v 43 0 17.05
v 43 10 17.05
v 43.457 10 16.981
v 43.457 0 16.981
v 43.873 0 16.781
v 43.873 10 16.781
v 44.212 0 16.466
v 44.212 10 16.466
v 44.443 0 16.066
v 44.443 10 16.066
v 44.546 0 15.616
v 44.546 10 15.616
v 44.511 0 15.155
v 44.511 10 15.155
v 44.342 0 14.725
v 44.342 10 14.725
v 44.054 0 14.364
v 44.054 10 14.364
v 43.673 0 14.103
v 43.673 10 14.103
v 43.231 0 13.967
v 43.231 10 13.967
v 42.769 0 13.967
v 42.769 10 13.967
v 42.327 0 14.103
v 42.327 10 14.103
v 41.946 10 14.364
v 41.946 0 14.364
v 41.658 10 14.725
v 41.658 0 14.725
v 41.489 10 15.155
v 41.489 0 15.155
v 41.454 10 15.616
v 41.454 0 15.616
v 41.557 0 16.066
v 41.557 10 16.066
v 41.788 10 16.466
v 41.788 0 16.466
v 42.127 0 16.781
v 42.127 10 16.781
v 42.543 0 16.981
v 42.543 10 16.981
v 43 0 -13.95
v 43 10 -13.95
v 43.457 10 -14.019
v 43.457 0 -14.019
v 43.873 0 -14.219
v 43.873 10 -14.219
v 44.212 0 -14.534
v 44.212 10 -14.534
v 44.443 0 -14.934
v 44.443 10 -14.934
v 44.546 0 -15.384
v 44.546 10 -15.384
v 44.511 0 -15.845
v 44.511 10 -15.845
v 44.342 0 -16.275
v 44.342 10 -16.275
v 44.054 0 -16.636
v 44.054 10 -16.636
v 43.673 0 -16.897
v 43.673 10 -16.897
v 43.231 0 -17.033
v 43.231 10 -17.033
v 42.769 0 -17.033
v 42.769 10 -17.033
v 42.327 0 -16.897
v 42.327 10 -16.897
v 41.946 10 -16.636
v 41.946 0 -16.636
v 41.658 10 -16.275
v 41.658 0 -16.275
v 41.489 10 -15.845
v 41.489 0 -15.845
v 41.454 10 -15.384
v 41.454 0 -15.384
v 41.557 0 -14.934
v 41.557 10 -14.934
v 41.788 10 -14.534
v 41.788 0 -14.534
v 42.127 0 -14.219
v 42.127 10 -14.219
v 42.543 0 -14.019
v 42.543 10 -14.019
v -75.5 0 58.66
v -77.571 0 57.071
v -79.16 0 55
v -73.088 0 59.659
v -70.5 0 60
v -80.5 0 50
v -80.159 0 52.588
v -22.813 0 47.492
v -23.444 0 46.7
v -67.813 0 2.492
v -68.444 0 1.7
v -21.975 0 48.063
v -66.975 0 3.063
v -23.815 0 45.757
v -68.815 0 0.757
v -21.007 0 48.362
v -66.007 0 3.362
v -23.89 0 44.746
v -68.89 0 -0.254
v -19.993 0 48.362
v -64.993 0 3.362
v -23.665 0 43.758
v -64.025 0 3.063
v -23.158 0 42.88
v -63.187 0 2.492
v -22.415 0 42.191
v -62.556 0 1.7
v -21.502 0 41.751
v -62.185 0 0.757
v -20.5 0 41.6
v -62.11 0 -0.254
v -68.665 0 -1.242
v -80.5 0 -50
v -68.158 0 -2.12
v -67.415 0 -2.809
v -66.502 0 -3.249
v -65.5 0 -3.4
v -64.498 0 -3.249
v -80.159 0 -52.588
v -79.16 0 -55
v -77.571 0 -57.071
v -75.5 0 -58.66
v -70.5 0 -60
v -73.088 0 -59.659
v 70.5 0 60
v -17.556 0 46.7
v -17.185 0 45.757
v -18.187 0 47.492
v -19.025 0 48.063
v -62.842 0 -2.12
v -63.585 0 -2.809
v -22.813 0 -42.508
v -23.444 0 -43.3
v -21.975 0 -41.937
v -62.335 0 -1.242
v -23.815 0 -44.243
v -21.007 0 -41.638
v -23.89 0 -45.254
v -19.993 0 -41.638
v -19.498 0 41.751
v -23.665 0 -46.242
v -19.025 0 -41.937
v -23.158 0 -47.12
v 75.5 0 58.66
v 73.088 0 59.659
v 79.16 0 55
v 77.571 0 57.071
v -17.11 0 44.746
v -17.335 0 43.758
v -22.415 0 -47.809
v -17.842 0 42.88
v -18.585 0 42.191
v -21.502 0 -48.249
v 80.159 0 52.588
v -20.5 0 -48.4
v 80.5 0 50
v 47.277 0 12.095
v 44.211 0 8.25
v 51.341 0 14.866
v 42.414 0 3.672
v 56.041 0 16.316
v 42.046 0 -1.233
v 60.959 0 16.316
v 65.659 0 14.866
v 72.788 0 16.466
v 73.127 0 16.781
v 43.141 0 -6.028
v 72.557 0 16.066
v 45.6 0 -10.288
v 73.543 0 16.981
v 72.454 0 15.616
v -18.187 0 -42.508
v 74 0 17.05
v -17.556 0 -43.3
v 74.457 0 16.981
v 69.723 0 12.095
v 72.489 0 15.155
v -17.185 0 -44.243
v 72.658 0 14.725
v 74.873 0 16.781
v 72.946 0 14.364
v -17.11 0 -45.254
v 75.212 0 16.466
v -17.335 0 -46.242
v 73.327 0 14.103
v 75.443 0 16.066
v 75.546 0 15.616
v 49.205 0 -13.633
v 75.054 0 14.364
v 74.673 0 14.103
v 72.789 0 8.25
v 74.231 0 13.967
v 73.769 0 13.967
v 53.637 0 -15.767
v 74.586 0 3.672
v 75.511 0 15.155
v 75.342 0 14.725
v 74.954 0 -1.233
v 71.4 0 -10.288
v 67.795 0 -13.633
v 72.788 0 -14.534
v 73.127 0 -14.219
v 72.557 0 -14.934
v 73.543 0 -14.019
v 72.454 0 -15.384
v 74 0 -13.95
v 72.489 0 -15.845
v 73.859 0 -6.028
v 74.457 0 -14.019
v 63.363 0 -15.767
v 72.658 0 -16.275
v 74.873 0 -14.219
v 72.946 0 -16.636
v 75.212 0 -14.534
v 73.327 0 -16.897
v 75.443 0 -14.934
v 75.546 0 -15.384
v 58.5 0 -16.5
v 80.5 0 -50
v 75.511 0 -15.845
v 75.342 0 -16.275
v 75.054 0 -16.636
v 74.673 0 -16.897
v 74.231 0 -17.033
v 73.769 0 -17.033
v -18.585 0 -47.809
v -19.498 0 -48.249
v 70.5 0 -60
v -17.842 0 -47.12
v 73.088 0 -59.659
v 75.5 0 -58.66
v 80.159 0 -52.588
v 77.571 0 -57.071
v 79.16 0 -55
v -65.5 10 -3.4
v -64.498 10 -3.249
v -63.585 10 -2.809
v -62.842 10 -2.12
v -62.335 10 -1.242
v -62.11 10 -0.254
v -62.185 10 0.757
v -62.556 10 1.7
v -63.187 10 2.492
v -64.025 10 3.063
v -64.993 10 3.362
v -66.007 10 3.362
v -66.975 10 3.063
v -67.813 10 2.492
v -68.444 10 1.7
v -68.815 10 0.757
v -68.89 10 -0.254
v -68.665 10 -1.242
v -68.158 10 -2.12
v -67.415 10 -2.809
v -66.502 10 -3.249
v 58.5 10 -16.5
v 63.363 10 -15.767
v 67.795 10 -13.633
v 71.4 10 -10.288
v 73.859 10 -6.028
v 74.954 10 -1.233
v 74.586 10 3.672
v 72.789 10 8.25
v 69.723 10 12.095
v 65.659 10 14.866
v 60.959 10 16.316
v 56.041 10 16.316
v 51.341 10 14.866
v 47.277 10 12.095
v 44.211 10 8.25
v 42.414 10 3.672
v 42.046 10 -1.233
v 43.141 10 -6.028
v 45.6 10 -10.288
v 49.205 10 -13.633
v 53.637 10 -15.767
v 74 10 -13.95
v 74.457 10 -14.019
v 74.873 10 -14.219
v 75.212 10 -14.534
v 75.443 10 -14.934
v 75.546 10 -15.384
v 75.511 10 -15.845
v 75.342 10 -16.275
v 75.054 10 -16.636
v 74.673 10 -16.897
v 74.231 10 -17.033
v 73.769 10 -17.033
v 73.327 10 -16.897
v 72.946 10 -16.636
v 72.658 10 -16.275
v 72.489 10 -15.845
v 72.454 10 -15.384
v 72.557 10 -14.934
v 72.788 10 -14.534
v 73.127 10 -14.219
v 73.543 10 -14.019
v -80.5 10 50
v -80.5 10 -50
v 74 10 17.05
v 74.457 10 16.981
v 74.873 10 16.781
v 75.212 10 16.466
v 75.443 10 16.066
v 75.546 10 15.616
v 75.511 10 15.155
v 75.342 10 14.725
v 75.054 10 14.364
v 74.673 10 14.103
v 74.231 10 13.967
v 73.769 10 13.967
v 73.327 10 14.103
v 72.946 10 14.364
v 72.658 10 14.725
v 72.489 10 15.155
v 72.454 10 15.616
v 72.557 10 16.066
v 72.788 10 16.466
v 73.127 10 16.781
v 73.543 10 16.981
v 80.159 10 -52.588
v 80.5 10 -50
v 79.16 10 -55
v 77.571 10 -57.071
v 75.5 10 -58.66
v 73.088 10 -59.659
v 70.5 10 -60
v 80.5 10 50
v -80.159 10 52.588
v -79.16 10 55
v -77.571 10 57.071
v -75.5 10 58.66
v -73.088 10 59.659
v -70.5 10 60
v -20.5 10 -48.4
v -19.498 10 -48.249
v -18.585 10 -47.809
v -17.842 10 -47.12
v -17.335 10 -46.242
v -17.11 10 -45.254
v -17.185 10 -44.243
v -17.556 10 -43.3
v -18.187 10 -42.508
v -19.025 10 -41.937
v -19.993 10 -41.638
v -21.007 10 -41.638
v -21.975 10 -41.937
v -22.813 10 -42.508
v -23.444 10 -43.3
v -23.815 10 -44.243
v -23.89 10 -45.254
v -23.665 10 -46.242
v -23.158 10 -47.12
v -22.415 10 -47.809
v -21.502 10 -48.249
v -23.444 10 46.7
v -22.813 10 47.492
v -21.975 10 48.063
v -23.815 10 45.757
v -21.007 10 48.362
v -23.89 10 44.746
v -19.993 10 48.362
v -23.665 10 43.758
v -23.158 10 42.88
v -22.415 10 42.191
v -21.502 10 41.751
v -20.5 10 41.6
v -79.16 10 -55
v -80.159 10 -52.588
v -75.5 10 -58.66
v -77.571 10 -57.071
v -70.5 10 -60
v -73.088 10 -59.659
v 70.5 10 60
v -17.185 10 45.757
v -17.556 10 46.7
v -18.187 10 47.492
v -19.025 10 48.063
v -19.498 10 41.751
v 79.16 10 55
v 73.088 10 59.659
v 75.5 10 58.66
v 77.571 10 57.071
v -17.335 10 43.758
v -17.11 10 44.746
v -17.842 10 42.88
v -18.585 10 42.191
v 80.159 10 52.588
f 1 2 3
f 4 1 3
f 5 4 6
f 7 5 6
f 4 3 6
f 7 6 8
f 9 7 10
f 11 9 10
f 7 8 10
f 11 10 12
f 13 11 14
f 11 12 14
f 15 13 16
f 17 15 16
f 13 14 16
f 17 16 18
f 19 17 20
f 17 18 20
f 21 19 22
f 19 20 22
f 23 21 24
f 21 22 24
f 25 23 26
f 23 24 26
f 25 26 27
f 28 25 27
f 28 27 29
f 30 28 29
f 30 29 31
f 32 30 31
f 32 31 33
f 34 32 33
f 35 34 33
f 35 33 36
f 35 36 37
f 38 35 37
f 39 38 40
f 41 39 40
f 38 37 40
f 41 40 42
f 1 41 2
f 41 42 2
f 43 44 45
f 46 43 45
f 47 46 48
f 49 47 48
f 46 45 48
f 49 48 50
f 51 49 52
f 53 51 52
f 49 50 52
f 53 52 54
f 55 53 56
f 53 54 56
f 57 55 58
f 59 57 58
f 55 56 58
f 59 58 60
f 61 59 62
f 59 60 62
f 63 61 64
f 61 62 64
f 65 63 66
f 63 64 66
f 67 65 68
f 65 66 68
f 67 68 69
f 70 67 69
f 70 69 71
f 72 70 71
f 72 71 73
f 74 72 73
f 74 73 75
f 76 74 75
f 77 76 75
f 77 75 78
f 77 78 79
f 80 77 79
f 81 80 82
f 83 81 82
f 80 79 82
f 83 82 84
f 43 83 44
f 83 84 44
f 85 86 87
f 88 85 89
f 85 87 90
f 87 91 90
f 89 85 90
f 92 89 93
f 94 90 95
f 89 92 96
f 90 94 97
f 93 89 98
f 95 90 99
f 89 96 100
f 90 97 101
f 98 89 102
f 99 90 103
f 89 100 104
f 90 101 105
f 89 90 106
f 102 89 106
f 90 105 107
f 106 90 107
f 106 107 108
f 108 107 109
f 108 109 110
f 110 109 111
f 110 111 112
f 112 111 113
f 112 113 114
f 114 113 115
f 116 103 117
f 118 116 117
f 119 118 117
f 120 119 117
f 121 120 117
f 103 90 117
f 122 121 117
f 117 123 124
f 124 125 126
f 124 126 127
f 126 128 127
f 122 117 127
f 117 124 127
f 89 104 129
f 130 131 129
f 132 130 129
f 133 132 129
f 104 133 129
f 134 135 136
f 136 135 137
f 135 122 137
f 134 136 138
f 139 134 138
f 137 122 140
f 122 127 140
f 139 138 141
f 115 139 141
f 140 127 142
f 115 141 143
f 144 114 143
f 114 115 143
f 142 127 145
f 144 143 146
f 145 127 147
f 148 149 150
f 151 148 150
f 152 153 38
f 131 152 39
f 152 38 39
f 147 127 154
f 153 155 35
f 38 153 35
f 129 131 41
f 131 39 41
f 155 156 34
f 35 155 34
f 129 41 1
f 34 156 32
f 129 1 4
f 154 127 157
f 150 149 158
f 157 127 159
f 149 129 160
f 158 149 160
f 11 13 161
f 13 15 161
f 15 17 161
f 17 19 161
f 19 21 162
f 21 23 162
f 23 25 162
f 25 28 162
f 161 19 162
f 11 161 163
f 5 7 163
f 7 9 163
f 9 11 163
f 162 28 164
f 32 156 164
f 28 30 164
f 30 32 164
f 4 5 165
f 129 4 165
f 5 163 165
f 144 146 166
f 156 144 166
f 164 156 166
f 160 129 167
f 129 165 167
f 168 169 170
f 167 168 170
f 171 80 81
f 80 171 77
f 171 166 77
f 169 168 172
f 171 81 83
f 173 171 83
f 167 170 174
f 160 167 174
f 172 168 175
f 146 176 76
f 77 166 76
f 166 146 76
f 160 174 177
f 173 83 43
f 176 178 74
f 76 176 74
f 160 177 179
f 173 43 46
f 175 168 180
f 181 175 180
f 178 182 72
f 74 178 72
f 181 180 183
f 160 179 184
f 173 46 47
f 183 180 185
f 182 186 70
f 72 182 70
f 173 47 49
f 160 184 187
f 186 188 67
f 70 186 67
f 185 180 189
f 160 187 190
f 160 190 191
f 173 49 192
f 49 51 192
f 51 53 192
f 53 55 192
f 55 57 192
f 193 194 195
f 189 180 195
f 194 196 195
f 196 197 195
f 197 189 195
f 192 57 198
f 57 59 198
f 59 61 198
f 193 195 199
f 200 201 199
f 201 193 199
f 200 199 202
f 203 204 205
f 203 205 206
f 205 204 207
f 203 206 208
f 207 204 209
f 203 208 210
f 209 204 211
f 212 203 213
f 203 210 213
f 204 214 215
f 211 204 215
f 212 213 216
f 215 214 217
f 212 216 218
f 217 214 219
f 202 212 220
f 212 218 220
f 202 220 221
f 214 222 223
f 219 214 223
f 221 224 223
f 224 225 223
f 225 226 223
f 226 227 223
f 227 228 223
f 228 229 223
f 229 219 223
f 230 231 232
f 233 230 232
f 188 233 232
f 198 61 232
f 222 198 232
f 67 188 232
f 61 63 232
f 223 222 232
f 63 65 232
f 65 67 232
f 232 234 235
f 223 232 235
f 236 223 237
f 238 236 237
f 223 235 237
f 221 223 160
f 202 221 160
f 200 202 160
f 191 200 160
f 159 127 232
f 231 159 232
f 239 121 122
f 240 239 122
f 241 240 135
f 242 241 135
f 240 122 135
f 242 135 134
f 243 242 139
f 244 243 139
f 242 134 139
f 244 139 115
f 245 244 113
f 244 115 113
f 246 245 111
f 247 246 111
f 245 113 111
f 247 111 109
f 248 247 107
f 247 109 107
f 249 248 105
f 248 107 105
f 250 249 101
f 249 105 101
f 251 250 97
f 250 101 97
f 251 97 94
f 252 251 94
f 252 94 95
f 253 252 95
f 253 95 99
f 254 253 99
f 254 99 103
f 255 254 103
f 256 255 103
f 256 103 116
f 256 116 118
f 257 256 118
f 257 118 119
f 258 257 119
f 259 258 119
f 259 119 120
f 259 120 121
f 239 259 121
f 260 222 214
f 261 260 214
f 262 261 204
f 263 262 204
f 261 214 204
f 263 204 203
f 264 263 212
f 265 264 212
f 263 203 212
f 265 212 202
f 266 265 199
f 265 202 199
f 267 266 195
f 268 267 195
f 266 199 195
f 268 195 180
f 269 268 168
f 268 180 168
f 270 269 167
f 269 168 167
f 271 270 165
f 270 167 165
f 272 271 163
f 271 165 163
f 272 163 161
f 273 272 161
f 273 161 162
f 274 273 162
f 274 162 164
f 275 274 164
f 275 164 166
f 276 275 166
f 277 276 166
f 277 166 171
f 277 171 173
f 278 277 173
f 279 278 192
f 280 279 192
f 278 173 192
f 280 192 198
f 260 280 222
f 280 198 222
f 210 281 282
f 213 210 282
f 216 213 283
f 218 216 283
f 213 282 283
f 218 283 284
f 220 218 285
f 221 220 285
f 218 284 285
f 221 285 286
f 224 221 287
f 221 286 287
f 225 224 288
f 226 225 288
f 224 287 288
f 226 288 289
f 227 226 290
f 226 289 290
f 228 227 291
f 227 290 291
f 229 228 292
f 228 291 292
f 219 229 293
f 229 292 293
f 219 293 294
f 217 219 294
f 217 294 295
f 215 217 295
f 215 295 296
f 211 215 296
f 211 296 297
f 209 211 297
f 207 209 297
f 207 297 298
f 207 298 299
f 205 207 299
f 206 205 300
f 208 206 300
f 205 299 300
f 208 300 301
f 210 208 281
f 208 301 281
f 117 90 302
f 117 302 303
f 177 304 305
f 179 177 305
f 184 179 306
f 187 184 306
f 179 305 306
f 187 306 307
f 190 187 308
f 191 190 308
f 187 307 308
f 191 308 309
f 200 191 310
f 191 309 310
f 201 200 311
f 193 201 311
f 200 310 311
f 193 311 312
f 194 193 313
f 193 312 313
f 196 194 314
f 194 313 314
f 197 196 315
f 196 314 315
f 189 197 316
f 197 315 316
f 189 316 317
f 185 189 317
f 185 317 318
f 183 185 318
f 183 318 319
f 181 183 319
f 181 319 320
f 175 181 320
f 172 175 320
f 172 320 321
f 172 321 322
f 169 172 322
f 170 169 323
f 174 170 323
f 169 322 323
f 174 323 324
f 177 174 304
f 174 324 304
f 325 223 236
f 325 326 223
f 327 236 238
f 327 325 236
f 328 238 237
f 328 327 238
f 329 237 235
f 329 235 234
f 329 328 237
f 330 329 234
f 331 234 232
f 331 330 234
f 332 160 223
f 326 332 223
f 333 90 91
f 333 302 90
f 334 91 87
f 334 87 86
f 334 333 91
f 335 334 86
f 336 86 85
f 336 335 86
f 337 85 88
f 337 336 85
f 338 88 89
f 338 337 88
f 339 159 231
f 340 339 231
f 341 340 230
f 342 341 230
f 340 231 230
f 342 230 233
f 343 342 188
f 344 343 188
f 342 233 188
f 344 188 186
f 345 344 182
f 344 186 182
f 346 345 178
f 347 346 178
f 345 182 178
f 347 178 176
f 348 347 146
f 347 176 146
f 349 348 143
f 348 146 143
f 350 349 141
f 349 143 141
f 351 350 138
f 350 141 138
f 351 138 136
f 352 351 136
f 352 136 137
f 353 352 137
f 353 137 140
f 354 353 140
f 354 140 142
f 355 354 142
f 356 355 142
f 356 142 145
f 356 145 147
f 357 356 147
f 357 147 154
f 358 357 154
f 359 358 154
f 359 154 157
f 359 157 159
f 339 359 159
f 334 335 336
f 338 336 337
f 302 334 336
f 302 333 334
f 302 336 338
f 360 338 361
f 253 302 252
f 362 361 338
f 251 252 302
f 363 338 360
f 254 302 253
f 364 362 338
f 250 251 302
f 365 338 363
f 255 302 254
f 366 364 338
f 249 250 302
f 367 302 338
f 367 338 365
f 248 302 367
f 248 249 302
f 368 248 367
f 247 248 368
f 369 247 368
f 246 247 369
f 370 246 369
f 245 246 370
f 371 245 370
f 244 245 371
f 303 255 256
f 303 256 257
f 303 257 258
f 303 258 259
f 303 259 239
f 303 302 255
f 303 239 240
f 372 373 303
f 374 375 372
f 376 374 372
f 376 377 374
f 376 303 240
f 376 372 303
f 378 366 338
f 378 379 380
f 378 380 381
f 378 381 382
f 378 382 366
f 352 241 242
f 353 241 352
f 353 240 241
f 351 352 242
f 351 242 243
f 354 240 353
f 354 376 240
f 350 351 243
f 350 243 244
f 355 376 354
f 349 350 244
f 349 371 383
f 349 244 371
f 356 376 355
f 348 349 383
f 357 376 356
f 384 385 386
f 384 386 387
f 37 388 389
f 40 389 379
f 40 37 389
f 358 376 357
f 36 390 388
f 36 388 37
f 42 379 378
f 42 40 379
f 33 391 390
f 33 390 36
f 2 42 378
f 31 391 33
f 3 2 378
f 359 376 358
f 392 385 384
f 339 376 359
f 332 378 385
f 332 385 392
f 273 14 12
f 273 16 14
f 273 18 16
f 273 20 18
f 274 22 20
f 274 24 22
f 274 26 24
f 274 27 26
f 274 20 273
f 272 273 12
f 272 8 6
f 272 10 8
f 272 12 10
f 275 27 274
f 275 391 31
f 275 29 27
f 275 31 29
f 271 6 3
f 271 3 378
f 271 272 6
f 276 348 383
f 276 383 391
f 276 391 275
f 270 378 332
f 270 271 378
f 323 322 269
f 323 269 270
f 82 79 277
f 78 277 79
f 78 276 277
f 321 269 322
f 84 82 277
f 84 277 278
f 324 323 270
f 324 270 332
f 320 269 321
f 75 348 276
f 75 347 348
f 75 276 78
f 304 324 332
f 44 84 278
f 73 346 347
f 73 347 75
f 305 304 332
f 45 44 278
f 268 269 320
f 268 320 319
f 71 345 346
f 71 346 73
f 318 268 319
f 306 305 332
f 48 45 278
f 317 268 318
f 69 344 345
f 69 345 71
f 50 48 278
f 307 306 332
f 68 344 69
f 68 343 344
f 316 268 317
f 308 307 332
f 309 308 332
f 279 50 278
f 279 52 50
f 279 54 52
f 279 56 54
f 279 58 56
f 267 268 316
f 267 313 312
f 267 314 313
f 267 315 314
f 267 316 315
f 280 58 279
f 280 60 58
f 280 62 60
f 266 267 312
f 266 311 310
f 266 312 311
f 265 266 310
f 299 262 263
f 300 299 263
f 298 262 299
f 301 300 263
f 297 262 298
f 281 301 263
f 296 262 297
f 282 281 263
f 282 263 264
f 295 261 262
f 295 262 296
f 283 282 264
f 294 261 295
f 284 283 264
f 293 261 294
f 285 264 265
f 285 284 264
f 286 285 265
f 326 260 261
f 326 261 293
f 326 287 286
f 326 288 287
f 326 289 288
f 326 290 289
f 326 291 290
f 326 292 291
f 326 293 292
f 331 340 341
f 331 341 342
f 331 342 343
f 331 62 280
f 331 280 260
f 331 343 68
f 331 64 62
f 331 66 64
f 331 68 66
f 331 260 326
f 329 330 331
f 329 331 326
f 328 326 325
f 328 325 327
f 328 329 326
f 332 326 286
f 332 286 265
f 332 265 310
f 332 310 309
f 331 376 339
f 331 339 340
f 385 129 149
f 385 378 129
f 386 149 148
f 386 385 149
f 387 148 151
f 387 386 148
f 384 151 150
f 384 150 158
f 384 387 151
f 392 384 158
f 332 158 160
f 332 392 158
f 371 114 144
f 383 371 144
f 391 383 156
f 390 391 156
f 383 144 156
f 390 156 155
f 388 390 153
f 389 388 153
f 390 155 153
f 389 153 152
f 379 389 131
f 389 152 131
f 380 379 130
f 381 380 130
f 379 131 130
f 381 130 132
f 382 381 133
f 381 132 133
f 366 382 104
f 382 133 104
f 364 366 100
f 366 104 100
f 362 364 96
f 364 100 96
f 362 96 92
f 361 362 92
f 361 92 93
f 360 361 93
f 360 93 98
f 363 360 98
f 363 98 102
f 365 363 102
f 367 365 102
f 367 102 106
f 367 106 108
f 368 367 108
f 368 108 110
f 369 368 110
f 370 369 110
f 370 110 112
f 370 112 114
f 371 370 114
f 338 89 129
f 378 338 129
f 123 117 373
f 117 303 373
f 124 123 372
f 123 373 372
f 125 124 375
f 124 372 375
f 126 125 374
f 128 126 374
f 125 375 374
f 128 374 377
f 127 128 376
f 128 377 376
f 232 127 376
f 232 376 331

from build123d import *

# Parameters (mm, degrees)
SKETCH_1_W          = 161
SKETCH_1_H          = 120
EXTRUDE_1_DEPTH     = 10
FILLET_1_R          = 10
SKETCH_2_R          = 1.55
CUT_EXTRUDE_1_DEPTH = 10
SKETCH_3_R          = 16.5
CUT_EXTRUDE_2_DEPTH = 10
SKETCH_4_R          = 3.4
CUT_EXTRUDE_3_DEPTH = 101.897224937


with BuildPart() as part:
    # 草图1 → 凸台-拉伸1 (new body)
    with BuildSketch(Plane(origin=(0, 0, 0), x_dir=(1, 0, 0), z_dir=(0, 1, 0))):
        Rectangle(SKETCH_1_W, SKETCH_1_H)
    extrude(amount=EXTRUDE_1_DEPTH)

    # 圆角1
    fillet_1_edges = [part.edges().sort_by_distance(p)[0] for p in [
        (80.5, 5, 60),
        (-80.5, 5, 60),
        (-80.5, 5, -60),
        (80.5, 5, -60),
    ]]
    fillet(fillet_1_edges, radius=FILLET_1_R)

    # 草图2 → 切除-拉伸1 (cut)
    with BuildSketch(Plane(origin=(0, 10, 0), x_dir=(1, 0, 0), z_dir=(0, 1, 0))):
        with Locations(Location((74, 15.5, 0), (0, 0, 270))):
            Circle(SKETCH_2_R)
        with Locations(Location((74, -15.5, 0), (0, 0, 270))):
            Circle(SKETCH_2_R)
        with Locations(Location((43, 15.5, 0), (0, 0, 270))):
            Circle(SKETCH_2_R)
        with Locations(Location((43, -15.5, 0), (0, 0, 270))):
            Circle(SKETCH_2_R)
    extrude(amount=-CUT_EXTRUDE_1_DEPTH, mode=Mode.SUBTRACT)

    # 草图3 → 切除-拉伸2 (cut)
    with BuildSketch(Plane.XZ):
        with Locations(Location((58.5, 0, 0), (0, 0, 270))):
            Circle(SKETCH_3_R)
    extrude(amount=-CUT_EXTRUDE_2_DEPTH, mode=Mode.SUBTRACT)

    # 草图4 → 切除-拉伸3 (cut, through all)
    with BuildSketch(Plane.XZ):
        with Locations(Location((-20.5, 45, 0), (0, 0, 270))):
            Circle(SKETCH_4_R)
        with Locations(Location((-65.5, 0, 0), (0, 0, 270))):
            Circle(SKETCH_4_R)
        with Locations(Location((-20.5, -45, 0), (0, 0, 270))):
            Circle(SKETCH_4_R)
    extrude(amount=-CUT_EXTRUDE_3_DEPTH, mode=Mode.SUBTRACT)


solid = part.part
